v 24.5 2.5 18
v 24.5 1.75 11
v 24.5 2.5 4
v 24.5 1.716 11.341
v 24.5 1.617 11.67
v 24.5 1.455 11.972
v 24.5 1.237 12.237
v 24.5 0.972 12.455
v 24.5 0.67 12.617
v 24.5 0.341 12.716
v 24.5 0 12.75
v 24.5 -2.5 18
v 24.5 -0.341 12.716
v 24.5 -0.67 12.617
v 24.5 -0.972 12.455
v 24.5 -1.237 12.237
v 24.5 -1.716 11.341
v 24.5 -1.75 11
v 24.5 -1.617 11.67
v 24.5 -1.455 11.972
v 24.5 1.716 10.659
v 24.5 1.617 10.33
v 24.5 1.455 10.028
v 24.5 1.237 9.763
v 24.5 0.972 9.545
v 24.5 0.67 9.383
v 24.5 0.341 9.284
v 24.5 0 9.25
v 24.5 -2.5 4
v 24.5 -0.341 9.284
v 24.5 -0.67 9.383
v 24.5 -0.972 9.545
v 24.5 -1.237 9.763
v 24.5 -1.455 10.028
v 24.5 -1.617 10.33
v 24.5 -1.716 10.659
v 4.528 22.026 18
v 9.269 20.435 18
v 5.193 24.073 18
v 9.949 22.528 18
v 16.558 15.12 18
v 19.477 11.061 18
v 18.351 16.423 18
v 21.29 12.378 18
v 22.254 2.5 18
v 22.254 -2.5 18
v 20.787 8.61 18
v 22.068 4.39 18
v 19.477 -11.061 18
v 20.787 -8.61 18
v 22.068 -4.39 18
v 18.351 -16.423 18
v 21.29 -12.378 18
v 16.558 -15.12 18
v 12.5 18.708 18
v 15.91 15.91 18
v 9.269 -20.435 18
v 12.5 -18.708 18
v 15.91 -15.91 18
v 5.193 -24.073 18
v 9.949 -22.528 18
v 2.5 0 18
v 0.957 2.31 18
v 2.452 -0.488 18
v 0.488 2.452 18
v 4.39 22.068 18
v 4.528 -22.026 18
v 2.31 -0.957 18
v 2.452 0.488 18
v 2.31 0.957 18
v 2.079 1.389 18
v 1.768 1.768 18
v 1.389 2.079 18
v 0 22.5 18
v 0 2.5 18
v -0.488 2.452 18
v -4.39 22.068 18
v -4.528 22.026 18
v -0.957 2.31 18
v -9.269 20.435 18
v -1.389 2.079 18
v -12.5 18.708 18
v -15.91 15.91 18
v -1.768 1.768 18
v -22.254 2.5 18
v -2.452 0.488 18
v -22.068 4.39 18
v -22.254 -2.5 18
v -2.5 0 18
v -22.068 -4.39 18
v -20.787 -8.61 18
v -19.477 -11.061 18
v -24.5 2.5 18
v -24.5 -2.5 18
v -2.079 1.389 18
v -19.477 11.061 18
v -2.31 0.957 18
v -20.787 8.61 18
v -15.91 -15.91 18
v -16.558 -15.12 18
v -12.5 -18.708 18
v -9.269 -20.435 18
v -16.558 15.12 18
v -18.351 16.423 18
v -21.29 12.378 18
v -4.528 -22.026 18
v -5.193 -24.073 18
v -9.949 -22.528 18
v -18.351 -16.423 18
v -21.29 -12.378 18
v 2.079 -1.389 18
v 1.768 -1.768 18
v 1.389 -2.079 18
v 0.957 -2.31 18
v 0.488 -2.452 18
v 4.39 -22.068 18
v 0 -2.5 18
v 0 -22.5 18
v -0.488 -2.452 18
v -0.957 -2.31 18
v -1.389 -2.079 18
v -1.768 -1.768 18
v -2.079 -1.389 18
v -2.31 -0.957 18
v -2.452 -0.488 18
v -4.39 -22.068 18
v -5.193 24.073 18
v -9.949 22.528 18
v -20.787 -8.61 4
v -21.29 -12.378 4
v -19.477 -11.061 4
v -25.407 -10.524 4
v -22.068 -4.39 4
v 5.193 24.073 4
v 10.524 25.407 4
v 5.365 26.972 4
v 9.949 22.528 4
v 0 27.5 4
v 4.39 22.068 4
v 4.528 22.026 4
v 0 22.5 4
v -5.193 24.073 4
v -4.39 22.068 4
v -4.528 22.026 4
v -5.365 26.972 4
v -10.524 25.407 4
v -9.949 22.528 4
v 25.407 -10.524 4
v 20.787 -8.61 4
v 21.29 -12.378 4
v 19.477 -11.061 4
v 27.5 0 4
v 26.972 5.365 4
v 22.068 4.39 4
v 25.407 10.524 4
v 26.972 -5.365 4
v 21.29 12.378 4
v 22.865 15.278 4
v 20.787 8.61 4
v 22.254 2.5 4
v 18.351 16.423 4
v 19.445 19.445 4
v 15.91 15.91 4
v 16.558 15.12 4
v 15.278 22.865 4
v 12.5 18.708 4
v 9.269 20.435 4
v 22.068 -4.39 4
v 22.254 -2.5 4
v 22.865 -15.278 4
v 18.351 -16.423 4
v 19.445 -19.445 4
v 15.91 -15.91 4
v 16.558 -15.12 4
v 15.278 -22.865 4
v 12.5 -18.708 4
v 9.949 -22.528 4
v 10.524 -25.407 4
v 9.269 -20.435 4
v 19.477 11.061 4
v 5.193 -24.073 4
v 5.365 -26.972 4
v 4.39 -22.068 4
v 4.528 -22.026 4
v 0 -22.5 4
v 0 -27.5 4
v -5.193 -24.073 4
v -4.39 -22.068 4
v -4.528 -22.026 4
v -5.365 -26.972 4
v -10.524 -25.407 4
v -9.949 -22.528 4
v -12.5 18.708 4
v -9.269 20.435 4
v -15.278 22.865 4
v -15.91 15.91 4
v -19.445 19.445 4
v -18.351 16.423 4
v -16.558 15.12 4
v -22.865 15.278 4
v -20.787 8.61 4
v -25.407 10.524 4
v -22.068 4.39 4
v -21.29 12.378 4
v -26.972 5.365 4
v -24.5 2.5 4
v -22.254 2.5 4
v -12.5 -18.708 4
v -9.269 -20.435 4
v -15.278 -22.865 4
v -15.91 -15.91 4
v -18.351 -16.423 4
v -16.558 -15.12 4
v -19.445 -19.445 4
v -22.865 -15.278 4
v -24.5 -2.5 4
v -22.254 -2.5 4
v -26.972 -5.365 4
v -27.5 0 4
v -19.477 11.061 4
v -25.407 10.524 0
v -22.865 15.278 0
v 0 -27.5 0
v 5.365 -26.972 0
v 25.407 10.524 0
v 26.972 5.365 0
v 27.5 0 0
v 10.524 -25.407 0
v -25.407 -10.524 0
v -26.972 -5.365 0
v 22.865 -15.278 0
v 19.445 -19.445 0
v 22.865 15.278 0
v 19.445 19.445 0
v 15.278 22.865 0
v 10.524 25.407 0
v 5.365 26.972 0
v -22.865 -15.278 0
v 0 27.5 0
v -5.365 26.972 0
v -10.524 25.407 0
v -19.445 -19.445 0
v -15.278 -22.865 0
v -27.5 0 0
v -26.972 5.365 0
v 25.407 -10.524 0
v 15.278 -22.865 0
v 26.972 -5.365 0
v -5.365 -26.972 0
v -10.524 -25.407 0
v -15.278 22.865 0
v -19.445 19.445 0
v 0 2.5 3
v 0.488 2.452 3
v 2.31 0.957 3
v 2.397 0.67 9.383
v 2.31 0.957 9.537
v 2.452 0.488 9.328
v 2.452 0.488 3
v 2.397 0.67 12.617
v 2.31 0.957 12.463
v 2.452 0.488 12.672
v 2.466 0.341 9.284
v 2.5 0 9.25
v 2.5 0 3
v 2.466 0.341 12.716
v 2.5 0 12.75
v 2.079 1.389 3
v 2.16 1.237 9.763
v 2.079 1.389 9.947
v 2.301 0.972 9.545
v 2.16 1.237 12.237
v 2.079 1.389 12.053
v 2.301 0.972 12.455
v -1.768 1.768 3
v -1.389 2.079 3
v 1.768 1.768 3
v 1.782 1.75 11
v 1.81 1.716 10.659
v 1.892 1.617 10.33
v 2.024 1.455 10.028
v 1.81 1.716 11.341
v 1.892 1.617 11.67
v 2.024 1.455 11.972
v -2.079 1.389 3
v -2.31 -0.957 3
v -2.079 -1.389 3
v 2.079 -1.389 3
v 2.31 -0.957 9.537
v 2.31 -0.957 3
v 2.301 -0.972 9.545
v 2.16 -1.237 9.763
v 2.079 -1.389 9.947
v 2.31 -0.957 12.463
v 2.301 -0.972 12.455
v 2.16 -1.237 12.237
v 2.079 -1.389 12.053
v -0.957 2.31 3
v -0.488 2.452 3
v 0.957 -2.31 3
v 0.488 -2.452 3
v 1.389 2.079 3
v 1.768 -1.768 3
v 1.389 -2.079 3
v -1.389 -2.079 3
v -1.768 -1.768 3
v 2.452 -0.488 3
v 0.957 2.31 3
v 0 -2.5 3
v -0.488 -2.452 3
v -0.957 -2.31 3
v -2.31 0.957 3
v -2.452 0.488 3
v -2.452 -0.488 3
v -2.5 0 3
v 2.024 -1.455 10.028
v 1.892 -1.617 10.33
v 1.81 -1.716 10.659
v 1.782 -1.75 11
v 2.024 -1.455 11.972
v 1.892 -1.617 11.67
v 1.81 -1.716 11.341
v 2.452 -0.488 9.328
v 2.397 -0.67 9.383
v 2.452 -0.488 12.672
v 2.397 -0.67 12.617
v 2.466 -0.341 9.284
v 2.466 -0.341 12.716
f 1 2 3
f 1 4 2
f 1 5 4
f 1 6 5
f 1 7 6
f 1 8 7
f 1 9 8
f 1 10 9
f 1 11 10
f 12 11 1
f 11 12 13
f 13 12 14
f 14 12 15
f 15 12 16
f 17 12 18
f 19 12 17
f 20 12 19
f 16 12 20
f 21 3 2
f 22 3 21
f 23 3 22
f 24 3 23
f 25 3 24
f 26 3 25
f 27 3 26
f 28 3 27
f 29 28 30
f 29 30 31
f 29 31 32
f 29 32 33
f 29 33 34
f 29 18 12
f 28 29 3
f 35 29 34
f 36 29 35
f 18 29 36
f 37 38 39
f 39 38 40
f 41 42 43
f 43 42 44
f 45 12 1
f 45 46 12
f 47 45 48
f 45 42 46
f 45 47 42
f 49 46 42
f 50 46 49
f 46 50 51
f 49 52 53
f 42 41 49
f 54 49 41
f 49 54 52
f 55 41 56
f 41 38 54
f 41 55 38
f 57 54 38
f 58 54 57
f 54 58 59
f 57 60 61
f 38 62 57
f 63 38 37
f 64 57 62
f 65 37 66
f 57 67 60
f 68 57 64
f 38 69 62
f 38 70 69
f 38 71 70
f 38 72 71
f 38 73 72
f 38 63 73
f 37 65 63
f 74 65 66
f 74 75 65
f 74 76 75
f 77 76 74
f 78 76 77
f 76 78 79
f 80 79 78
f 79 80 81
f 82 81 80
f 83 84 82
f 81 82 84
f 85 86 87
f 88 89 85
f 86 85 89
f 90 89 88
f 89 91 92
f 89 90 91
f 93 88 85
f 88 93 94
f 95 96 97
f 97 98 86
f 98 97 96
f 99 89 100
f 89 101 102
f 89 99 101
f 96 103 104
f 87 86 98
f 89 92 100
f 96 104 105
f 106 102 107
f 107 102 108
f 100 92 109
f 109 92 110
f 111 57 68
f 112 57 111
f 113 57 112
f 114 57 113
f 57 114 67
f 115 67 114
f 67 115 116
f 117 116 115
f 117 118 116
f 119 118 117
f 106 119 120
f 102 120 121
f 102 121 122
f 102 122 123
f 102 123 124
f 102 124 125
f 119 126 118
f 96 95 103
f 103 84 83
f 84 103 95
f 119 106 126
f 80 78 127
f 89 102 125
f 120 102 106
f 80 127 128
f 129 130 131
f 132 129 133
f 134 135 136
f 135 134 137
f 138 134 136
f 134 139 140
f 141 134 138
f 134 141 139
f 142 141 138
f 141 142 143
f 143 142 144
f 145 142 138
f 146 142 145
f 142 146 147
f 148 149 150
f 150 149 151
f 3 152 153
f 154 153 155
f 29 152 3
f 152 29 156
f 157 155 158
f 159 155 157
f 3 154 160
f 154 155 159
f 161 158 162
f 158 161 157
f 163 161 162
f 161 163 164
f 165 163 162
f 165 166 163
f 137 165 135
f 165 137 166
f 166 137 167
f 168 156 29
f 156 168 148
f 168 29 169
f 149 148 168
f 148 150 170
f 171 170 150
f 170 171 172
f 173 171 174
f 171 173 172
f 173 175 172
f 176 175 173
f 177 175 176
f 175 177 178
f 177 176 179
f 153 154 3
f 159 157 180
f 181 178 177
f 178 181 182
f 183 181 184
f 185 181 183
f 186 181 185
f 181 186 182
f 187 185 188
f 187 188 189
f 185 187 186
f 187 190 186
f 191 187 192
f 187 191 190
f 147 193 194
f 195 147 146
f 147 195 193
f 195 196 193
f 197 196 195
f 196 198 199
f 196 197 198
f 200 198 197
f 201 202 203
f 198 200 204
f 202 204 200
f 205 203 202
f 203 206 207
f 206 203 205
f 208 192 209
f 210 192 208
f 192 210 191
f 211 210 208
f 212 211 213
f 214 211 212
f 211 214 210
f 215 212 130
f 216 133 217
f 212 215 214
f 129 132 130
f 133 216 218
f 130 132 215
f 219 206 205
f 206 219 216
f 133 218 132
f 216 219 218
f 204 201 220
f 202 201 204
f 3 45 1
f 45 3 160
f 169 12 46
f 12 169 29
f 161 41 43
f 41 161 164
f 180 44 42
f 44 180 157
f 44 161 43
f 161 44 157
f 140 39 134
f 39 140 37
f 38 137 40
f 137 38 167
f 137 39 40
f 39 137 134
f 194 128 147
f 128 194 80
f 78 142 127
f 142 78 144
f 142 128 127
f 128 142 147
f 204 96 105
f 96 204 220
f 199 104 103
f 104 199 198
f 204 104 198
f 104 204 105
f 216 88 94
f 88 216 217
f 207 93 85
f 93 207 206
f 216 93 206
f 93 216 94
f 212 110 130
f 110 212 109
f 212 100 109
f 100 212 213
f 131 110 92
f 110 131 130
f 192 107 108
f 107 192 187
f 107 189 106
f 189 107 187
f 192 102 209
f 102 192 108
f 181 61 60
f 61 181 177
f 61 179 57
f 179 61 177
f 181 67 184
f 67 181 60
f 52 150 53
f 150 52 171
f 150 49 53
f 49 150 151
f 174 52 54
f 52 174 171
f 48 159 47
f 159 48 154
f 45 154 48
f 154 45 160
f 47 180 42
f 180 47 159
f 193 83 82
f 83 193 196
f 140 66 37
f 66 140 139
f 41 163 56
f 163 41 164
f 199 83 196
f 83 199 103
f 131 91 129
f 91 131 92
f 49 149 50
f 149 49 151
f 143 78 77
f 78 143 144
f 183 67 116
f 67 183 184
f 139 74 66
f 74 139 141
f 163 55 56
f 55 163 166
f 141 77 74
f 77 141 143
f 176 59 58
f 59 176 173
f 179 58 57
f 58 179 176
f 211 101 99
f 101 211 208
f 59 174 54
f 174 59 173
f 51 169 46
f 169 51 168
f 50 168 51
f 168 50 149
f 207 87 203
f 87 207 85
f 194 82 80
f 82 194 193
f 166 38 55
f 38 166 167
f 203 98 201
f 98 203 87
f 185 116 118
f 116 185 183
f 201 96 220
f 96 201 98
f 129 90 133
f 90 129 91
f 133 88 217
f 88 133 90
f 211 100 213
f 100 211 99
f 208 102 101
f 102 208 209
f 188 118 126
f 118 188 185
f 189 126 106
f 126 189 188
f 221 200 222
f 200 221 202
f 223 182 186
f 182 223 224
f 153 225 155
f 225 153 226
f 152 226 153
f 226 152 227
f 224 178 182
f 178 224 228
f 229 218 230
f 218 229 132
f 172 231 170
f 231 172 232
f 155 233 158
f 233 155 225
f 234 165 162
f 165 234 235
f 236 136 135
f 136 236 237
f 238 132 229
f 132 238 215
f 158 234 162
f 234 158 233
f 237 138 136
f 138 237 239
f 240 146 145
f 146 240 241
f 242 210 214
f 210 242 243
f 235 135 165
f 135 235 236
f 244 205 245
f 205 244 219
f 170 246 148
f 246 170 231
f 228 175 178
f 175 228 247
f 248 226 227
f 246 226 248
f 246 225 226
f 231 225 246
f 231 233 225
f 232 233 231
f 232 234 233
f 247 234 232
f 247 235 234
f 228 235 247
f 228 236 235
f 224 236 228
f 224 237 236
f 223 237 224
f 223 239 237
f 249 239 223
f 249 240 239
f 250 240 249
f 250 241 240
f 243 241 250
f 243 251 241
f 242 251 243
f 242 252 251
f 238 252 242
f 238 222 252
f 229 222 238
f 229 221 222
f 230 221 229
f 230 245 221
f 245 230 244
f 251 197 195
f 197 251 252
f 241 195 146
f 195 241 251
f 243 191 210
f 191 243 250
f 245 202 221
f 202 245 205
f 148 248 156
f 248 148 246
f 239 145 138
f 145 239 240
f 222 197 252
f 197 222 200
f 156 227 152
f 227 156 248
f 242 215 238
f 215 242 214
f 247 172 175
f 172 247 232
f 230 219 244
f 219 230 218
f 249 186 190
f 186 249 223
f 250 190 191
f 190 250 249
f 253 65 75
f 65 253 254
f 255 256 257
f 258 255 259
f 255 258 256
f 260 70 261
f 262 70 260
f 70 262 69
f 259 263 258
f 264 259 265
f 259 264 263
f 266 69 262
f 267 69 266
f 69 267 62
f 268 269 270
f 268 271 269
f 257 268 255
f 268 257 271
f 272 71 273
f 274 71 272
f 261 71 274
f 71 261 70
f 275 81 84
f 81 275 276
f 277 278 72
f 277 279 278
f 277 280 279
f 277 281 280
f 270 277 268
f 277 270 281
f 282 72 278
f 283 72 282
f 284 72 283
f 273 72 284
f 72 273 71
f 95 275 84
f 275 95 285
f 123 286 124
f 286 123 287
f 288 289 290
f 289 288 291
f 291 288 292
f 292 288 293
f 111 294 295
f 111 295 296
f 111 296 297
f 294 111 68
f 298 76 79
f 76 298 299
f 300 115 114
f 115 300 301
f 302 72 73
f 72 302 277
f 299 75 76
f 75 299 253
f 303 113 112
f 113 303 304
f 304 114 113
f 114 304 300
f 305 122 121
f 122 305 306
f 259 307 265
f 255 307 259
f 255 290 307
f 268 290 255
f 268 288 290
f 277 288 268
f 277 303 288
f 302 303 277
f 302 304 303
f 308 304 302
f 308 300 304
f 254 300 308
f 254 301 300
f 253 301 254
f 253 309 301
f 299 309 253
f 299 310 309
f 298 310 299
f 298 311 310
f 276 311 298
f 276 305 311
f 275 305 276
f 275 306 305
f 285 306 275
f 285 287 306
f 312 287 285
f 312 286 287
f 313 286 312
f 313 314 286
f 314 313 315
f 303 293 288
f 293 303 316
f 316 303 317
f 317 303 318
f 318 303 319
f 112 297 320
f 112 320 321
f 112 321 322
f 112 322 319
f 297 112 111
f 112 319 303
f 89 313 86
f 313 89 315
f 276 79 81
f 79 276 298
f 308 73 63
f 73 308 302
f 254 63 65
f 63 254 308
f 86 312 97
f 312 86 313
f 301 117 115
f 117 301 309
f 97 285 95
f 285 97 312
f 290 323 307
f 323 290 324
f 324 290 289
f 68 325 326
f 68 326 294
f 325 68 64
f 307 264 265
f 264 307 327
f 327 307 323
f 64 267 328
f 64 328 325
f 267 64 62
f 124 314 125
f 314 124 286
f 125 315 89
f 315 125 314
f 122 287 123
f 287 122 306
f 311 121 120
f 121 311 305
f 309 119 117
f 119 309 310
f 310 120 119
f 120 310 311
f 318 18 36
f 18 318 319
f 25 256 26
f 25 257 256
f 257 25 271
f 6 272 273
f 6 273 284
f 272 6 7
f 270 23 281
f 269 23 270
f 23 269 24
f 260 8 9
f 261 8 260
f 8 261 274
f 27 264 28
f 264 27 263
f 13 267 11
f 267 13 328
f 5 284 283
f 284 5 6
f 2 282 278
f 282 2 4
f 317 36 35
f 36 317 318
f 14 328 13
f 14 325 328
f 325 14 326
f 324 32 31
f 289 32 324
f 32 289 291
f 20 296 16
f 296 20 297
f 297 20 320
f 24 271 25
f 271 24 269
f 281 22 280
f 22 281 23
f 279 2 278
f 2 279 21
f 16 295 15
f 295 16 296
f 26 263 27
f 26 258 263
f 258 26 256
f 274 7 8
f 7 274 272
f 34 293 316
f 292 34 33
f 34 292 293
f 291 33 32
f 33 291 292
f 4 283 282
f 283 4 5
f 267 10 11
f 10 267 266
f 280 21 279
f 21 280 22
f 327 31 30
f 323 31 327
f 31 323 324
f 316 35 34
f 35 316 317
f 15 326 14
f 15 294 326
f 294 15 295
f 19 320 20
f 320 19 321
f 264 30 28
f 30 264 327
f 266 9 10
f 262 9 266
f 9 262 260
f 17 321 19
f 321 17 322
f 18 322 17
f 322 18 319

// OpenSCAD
$fn = 32;

// ----------------------------------------------------------------------
// Control knob: skirt knob with grip ribs
// ----------------------------------------------------------------------

// --- parameters (mm) ---
skirt_d = 55;             // skirt diameter
skirt_t = 4;              // skirt thickness
rib_w = 5;                // grip rib width
rib_out = 3;              // grip rib radial protrusion
n_ribs = 10;              // number of grip ribs
knob_d = 45;              // knob body diameter
knob_h = 14;              // knob body height
bore_d = 5;               // shaft bore diameter
set_d = 3.5;              // set screw bore diameter
fit_tol = 0.1;            // tolerance for press fits, mm
free_tol = 0.3;           // tolerance for clearance fits, mm

rib_step = 360 / n_ribs;  // rib angular step
total_h = skirt_t + knob_h;  // overall height

difference() {
  union() {
    translate([0, 0, skirt_t]) cylinder(h = knob_h, d = knob_d);
    cylinder(h = skirt_t, d = skirt_d);
    for (i = [0 : n_ribs - 1])
      rotate([0, 0, i * rib_step])
        translate([knob_d / 2 - 1, -rib_w / 2, skirt_t])
          cube([rib_out, rib_w, knob_h]);
  }
  translate([0, 0, skirt_t - 1]) cylinder(h = knob_h + 2, d = bore_d);
  translate([-1, 0, skirt_t + knob_h / 2]) rotate([0, 90, 0])
    cylinder(h = knob_d / 2 + bore_d / 2 + 2, d = set_d);
}
